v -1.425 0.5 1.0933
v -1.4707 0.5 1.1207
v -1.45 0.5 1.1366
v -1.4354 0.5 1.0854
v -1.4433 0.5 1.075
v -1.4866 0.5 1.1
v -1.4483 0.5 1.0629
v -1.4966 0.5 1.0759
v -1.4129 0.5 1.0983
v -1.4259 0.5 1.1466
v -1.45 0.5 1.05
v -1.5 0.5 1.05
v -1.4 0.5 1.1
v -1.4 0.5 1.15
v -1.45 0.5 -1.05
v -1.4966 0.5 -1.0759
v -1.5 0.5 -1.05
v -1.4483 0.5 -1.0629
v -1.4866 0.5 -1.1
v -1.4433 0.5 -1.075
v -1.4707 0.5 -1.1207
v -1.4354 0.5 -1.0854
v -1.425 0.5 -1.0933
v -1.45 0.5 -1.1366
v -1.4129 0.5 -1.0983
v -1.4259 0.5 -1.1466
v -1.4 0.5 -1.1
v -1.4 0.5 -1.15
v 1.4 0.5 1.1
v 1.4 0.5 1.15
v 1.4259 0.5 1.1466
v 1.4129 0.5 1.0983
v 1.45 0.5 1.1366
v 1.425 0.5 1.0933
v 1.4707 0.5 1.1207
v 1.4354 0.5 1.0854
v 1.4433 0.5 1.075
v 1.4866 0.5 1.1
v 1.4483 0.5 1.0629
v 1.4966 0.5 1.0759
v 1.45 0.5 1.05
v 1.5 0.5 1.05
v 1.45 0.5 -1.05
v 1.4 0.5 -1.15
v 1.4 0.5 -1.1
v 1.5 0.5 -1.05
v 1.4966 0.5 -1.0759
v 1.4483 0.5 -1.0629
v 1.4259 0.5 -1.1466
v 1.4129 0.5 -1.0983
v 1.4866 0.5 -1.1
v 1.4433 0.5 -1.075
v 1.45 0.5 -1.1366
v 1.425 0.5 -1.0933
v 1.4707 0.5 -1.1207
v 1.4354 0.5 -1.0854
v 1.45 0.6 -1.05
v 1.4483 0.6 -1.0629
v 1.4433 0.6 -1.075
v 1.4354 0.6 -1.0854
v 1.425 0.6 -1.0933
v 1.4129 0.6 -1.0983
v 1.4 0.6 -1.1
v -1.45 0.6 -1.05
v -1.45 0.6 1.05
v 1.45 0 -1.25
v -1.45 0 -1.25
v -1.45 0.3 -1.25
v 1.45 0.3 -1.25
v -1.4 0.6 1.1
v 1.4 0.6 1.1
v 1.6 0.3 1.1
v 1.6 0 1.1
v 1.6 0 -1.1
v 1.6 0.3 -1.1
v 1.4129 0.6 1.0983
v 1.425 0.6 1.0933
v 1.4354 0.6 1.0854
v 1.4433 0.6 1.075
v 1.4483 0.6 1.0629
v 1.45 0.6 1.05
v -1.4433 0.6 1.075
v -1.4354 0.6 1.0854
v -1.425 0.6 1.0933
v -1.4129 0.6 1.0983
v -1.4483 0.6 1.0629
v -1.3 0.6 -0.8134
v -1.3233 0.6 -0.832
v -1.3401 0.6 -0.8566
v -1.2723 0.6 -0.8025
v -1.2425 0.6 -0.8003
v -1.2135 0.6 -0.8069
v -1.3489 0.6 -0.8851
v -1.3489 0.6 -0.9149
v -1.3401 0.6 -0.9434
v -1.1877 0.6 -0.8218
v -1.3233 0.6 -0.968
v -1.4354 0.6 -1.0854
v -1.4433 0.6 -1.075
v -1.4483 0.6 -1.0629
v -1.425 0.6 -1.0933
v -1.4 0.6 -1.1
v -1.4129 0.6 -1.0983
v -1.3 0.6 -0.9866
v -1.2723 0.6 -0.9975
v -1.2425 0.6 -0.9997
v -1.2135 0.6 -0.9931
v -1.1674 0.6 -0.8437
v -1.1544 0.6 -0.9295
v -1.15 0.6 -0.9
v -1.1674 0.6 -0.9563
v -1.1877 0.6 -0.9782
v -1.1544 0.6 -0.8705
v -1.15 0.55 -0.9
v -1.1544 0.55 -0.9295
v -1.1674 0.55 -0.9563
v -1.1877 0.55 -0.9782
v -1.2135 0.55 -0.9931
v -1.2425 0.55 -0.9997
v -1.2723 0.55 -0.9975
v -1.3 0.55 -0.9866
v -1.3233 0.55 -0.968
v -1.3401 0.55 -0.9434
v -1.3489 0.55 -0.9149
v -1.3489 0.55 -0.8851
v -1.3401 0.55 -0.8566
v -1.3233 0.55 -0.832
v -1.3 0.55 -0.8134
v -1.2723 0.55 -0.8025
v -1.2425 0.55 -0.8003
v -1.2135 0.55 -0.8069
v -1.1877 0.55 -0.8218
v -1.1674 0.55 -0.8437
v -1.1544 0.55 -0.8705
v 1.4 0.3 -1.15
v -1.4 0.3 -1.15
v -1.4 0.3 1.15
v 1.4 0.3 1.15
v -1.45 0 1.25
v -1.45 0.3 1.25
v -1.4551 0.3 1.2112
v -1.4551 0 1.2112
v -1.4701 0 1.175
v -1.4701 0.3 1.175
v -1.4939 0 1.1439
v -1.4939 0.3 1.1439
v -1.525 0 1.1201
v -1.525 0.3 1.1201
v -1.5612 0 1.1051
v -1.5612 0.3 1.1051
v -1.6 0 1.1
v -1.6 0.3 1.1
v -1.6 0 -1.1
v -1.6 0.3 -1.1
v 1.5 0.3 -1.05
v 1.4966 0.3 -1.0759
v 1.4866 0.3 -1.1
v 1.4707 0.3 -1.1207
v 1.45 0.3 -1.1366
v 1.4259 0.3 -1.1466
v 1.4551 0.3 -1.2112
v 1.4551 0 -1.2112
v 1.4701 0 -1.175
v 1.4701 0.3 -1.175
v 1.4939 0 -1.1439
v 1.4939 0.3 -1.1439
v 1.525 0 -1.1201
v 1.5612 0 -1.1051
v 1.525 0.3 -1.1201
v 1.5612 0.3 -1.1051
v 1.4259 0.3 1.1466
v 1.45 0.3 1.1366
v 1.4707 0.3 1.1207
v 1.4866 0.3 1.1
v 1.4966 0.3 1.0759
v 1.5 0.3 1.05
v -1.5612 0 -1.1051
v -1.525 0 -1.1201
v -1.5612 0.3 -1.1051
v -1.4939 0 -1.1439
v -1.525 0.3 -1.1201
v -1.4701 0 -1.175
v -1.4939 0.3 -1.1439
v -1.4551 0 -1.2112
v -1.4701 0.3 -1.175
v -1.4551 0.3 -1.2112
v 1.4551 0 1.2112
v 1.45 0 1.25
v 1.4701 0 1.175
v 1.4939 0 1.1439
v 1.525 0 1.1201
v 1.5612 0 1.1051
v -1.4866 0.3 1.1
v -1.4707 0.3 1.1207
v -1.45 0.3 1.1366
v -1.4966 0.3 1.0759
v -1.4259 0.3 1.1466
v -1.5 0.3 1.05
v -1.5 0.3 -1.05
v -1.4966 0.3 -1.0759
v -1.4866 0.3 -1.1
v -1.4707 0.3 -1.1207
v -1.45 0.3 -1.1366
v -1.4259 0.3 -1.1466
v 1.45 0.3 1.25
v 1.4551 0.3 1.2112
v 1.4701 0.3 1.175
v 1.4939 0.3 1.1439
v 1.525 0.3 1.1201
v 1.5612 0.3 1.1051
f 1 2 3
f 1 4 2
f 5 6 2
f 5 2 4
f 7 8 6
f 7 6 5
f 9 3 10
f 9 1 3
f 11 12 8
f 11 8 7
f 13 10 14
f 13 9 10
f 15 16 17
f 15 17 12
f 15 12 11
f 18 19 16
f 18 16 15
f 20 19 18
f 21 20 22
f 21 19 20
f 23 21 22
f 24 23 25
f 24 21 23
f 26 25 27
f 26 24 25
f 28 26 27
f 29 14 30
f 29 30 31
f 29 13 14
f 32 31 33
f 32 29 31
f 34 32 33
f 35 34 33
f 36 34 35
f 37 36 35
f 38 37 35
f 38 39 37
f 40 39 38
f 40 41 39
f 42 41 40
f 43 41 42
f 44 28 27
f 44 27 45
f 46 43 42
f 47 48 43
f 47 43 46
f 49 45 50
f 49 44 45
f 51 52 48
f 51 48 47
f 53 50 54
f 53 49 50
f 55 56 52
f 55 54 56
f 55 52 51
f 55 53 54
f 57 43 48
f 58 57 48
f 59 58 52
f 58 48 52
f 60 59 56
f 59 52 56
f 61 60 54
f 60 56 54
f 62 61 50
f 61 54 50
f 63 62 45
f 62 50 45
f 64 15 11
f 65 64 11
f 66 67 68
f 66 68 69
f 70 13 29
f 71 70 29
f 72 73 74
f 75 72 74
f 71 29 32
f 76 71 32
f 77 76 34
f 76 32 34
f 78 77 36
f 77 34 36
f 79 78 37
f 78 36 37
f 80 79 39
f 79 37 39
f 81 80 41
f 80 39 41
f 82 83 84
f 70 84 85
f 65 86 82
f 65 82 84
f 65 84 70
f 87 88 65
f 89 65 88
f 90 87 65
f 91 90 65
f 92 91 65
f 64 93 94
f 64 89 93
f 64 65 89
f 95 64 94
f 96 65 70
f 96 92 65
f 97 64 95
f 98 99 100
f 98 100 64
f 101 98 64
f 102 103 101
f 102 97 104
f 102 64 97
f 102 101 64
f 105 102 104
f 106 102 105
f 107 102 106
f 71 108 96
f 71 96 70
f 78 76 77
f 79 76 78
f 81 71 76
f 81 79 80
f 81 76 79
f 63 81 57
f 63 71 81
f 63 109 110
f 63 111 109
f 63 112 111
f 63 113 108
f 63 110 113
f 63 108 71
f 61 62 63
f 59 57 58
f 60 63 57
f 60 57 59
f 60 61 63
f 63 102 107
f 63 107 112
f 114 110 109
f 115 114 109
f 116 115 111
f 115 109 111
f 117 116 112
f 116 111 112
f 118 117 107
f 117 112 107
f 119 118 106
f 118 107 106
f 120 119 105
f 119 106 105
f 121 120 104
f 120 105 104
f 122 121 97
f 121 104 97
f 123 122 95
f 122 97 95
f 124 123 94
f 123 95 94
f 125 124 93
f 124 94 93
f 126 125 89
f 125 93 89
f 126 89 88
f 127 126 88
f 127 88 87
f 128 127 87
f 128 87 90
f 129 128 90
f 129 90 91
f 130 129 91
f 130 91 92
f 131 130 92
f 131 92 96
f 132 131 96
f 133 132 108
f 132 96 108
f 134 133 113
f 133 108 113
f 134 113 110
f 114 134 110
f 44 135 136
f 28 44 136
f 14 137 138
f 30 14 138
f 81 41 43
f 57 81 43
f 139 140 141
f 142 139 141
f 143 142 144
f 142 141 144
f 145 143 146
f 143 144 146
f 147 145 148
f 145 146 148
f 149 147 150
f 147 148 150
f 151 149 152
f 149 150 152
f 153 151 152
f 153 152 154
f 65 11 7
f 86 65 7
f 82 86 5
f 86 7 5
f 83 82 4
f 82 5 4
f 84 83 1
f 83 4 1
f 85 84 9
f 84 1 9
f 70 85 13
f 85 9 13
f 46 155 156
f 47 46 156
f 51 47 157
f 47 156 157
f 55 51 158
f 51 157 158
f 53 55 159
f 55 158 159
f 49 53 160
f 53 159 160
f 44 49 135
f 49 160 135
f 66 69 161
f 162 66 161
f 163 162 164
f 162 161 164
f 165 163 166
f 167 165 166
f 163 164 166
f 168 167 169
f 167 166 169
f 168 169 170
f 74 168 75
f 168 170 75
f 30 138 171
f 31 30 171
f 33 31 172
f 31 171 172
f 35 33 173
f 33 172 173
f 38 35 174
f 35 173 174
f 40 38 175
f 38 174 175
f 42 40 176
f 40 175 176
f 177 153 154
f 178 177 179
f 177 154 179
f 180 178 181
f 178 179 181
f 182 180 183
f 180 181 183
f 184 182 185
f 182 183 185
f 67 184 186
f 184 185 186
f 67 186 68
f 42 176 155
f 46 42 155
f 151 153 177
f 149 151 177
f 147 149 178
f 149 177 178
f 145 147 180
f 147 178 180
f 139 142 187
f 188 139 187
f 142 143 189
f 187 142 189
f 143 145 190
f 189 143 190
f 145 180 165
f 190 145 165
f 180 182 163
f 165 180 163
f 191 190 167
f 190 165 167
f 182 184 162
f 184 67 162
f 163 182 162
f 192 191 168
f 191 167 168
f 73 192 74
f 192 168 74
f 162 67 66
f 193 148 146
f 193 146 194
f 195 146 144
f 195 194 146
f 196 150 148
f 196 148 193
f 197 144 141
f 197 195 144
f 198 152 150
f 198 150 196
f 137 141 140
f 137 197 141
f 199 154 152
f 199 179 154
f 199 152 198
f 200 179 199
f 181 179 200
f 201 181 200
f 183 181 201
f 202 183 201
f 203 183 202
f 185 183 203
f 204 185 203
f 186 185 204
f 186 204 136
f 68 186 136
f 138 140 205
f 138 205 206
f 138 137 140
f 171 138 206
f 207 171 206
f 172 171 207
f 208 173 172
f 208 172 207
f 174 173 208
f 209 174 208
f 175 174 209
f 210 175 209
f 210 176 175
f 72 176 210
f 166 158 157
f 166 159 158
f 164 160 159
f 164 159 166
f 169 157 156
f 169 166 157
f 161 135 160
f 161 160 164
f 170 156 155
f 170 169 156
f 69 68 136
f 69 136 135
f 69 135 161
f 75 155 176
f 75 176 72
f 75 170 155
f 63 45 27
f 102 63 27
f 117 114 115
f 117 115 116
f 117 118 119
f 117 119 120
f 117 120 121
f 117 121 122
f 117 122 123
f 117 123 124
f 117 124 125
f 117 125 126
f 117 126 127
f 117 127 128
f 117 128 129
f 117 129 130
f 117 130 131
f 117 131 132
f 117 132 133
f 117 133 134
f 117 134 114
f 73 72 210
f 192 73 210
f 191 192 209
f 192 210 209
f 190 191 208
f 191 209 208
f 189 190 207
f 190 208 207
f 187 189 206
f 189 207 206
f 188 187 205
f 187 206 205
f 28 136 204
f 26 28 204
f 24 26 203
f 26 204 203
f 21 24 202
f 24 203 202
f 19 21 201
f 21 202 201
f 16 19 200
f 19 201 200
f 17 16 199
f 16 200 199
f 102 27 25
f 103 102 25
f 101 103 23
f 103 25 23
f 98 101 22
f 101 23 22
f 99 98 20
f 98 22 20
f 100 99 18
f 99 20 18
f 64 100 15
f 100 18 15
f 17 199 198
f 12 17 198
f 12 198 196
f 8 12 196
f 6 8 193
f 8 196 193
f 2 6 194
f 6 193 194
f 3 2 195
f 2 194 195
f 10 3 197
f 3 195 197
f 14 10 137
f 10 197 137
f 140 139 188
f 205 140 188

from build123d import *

# Parameters (mm, degrees)
SKETCH1_W           = 3.2
SKETCH1_H           = 2.5
BOSS_EXTRUDE1_DEPTH = 0.3
BOSS_EXTRUDE2_DEPTH = 0.2
BOSS_EXTRUDE3_DEPTH = 0.1
SKETCH4_R           = 0.15
CUT_EXTRUDE1_DEPTH  = 1.3
SKETCH5_R           = 0.1
CUT_EXTRUDE2_DEPTH  = 0.05


with BuildPart() as part:
    # Sketch1 → Boss-Extrude1 (new body)
    with BuildSketch(Plane(origin=(0, 0, 0), x_dir=(1, 0, 0), z_dir=(0, 1, 0))):
        Rectangle(SKETCH1_W, SKETCH1_H)
    extrude(amount=BOSS_EXTRUDE1_DEPTH)

    # Sketch2 → Boss-Extrude2 (add)
    with BuildSketch(Plane(origin=(0, 0.3, 0), x_dir=(1, 0, 0), z_dir=(0, 1, 0))):
        with BuildLine():
            Line((-1.4, -1.15), (1.4, -1.15))
            ThreePointArc((1.4, -1.15), (1.470710678, -1.120710678), (1.5, -1.05))
            Line((1.5, -1.05), (1.5, 1.05))
            ThreePointArc((1.5, 1.05), (1.470710678, 1.120710678), (1.4, 1.15))
            Line((1.4, 1.15), (-1.4, 1.15))
            ThreePointArc((-1.4, 1.15), (-1.470710678, 1.120710678), (-1.5, 1.05))
            Line((-1.5, 1.05), (-1.5, -1.05))
            ThreePointArc((-1.5, -1.05), (-1.470710678, -1.120710678), (-1.4, -1.15))
        make_face()
    extrude(amount=BOSS_EXTRUDE2_DEPTH)

    # Sketch3 → Boss-Extrude3 (add)
    with BuildSketch(Plane(origin=(0, 0.5, 0), x_dir=(1, 0, 0), z_dir=(0, 1, 0))):
        with BuildLine():
            Line((-1.4, -1.1), (1.4, -1.1))
            ThreePointArc((1.4, -1.1), (1.435355339, -1.085355339), (1.45, -1.05))
            Line((1.45, -1.05), (1.45, 1.05))
            ThreePointArc((1.45, 1.05), (1.435355339, 1.085355339), (1.4, 1.1))
            Line((1.4, 1.1), (-1.4, 1.1))
            ThreePointArc((-1.4, 1.1), (-1.435355339, 1.085355339), (-1.45, 1.05))
            Line((-1.45, 1.05), (-1.45, -1.05))
            ThreePointArc((-1.45, -1.05), (-1.435355339, -1.085355339), (-1.4, -1.1))
        make_face()
    extrude(amount=BOSS_EXTRUDE3_DEPTH)

    # Sketch4 → Cut-Extrude1 (cut, through all)
    with BuildSketch(Plane(origin=(0, 0.3, 0), x_dir=(1, 0, 0), z_dir=(0, 1, 0))):
        with Locations((-1.6, 1.25)):
            Circle(SKETCH4_R)
        with Locations((1.6, 1.25)):
            Circle(SKETCH4_R)
        with Locations((1.6, -1.25)):
            Circle(SKETCH4_R)
        with Locations((-1.6, -1.25)):
            Circle(SKETCH4_R)
    extrude(amount=-CUT_EXTRUDE1_DEPTH, mode=Mode.SUBTRACT)

    # Sketch5 → Cut-Extrude2 (cut)
    with BuildSketch(Plane(origin=(0, 0.6, 0), x_dir=(1, 0, 0), z_dir=(0, 1, 0))):
        with Locations((-1.25, 0.9)):
            Circle(SKETCH5_R)
    extrude(amount=-CUT_EXTRUDE2_DEPTH, mode=Mode.SUBTRACT)


solid = part.part
